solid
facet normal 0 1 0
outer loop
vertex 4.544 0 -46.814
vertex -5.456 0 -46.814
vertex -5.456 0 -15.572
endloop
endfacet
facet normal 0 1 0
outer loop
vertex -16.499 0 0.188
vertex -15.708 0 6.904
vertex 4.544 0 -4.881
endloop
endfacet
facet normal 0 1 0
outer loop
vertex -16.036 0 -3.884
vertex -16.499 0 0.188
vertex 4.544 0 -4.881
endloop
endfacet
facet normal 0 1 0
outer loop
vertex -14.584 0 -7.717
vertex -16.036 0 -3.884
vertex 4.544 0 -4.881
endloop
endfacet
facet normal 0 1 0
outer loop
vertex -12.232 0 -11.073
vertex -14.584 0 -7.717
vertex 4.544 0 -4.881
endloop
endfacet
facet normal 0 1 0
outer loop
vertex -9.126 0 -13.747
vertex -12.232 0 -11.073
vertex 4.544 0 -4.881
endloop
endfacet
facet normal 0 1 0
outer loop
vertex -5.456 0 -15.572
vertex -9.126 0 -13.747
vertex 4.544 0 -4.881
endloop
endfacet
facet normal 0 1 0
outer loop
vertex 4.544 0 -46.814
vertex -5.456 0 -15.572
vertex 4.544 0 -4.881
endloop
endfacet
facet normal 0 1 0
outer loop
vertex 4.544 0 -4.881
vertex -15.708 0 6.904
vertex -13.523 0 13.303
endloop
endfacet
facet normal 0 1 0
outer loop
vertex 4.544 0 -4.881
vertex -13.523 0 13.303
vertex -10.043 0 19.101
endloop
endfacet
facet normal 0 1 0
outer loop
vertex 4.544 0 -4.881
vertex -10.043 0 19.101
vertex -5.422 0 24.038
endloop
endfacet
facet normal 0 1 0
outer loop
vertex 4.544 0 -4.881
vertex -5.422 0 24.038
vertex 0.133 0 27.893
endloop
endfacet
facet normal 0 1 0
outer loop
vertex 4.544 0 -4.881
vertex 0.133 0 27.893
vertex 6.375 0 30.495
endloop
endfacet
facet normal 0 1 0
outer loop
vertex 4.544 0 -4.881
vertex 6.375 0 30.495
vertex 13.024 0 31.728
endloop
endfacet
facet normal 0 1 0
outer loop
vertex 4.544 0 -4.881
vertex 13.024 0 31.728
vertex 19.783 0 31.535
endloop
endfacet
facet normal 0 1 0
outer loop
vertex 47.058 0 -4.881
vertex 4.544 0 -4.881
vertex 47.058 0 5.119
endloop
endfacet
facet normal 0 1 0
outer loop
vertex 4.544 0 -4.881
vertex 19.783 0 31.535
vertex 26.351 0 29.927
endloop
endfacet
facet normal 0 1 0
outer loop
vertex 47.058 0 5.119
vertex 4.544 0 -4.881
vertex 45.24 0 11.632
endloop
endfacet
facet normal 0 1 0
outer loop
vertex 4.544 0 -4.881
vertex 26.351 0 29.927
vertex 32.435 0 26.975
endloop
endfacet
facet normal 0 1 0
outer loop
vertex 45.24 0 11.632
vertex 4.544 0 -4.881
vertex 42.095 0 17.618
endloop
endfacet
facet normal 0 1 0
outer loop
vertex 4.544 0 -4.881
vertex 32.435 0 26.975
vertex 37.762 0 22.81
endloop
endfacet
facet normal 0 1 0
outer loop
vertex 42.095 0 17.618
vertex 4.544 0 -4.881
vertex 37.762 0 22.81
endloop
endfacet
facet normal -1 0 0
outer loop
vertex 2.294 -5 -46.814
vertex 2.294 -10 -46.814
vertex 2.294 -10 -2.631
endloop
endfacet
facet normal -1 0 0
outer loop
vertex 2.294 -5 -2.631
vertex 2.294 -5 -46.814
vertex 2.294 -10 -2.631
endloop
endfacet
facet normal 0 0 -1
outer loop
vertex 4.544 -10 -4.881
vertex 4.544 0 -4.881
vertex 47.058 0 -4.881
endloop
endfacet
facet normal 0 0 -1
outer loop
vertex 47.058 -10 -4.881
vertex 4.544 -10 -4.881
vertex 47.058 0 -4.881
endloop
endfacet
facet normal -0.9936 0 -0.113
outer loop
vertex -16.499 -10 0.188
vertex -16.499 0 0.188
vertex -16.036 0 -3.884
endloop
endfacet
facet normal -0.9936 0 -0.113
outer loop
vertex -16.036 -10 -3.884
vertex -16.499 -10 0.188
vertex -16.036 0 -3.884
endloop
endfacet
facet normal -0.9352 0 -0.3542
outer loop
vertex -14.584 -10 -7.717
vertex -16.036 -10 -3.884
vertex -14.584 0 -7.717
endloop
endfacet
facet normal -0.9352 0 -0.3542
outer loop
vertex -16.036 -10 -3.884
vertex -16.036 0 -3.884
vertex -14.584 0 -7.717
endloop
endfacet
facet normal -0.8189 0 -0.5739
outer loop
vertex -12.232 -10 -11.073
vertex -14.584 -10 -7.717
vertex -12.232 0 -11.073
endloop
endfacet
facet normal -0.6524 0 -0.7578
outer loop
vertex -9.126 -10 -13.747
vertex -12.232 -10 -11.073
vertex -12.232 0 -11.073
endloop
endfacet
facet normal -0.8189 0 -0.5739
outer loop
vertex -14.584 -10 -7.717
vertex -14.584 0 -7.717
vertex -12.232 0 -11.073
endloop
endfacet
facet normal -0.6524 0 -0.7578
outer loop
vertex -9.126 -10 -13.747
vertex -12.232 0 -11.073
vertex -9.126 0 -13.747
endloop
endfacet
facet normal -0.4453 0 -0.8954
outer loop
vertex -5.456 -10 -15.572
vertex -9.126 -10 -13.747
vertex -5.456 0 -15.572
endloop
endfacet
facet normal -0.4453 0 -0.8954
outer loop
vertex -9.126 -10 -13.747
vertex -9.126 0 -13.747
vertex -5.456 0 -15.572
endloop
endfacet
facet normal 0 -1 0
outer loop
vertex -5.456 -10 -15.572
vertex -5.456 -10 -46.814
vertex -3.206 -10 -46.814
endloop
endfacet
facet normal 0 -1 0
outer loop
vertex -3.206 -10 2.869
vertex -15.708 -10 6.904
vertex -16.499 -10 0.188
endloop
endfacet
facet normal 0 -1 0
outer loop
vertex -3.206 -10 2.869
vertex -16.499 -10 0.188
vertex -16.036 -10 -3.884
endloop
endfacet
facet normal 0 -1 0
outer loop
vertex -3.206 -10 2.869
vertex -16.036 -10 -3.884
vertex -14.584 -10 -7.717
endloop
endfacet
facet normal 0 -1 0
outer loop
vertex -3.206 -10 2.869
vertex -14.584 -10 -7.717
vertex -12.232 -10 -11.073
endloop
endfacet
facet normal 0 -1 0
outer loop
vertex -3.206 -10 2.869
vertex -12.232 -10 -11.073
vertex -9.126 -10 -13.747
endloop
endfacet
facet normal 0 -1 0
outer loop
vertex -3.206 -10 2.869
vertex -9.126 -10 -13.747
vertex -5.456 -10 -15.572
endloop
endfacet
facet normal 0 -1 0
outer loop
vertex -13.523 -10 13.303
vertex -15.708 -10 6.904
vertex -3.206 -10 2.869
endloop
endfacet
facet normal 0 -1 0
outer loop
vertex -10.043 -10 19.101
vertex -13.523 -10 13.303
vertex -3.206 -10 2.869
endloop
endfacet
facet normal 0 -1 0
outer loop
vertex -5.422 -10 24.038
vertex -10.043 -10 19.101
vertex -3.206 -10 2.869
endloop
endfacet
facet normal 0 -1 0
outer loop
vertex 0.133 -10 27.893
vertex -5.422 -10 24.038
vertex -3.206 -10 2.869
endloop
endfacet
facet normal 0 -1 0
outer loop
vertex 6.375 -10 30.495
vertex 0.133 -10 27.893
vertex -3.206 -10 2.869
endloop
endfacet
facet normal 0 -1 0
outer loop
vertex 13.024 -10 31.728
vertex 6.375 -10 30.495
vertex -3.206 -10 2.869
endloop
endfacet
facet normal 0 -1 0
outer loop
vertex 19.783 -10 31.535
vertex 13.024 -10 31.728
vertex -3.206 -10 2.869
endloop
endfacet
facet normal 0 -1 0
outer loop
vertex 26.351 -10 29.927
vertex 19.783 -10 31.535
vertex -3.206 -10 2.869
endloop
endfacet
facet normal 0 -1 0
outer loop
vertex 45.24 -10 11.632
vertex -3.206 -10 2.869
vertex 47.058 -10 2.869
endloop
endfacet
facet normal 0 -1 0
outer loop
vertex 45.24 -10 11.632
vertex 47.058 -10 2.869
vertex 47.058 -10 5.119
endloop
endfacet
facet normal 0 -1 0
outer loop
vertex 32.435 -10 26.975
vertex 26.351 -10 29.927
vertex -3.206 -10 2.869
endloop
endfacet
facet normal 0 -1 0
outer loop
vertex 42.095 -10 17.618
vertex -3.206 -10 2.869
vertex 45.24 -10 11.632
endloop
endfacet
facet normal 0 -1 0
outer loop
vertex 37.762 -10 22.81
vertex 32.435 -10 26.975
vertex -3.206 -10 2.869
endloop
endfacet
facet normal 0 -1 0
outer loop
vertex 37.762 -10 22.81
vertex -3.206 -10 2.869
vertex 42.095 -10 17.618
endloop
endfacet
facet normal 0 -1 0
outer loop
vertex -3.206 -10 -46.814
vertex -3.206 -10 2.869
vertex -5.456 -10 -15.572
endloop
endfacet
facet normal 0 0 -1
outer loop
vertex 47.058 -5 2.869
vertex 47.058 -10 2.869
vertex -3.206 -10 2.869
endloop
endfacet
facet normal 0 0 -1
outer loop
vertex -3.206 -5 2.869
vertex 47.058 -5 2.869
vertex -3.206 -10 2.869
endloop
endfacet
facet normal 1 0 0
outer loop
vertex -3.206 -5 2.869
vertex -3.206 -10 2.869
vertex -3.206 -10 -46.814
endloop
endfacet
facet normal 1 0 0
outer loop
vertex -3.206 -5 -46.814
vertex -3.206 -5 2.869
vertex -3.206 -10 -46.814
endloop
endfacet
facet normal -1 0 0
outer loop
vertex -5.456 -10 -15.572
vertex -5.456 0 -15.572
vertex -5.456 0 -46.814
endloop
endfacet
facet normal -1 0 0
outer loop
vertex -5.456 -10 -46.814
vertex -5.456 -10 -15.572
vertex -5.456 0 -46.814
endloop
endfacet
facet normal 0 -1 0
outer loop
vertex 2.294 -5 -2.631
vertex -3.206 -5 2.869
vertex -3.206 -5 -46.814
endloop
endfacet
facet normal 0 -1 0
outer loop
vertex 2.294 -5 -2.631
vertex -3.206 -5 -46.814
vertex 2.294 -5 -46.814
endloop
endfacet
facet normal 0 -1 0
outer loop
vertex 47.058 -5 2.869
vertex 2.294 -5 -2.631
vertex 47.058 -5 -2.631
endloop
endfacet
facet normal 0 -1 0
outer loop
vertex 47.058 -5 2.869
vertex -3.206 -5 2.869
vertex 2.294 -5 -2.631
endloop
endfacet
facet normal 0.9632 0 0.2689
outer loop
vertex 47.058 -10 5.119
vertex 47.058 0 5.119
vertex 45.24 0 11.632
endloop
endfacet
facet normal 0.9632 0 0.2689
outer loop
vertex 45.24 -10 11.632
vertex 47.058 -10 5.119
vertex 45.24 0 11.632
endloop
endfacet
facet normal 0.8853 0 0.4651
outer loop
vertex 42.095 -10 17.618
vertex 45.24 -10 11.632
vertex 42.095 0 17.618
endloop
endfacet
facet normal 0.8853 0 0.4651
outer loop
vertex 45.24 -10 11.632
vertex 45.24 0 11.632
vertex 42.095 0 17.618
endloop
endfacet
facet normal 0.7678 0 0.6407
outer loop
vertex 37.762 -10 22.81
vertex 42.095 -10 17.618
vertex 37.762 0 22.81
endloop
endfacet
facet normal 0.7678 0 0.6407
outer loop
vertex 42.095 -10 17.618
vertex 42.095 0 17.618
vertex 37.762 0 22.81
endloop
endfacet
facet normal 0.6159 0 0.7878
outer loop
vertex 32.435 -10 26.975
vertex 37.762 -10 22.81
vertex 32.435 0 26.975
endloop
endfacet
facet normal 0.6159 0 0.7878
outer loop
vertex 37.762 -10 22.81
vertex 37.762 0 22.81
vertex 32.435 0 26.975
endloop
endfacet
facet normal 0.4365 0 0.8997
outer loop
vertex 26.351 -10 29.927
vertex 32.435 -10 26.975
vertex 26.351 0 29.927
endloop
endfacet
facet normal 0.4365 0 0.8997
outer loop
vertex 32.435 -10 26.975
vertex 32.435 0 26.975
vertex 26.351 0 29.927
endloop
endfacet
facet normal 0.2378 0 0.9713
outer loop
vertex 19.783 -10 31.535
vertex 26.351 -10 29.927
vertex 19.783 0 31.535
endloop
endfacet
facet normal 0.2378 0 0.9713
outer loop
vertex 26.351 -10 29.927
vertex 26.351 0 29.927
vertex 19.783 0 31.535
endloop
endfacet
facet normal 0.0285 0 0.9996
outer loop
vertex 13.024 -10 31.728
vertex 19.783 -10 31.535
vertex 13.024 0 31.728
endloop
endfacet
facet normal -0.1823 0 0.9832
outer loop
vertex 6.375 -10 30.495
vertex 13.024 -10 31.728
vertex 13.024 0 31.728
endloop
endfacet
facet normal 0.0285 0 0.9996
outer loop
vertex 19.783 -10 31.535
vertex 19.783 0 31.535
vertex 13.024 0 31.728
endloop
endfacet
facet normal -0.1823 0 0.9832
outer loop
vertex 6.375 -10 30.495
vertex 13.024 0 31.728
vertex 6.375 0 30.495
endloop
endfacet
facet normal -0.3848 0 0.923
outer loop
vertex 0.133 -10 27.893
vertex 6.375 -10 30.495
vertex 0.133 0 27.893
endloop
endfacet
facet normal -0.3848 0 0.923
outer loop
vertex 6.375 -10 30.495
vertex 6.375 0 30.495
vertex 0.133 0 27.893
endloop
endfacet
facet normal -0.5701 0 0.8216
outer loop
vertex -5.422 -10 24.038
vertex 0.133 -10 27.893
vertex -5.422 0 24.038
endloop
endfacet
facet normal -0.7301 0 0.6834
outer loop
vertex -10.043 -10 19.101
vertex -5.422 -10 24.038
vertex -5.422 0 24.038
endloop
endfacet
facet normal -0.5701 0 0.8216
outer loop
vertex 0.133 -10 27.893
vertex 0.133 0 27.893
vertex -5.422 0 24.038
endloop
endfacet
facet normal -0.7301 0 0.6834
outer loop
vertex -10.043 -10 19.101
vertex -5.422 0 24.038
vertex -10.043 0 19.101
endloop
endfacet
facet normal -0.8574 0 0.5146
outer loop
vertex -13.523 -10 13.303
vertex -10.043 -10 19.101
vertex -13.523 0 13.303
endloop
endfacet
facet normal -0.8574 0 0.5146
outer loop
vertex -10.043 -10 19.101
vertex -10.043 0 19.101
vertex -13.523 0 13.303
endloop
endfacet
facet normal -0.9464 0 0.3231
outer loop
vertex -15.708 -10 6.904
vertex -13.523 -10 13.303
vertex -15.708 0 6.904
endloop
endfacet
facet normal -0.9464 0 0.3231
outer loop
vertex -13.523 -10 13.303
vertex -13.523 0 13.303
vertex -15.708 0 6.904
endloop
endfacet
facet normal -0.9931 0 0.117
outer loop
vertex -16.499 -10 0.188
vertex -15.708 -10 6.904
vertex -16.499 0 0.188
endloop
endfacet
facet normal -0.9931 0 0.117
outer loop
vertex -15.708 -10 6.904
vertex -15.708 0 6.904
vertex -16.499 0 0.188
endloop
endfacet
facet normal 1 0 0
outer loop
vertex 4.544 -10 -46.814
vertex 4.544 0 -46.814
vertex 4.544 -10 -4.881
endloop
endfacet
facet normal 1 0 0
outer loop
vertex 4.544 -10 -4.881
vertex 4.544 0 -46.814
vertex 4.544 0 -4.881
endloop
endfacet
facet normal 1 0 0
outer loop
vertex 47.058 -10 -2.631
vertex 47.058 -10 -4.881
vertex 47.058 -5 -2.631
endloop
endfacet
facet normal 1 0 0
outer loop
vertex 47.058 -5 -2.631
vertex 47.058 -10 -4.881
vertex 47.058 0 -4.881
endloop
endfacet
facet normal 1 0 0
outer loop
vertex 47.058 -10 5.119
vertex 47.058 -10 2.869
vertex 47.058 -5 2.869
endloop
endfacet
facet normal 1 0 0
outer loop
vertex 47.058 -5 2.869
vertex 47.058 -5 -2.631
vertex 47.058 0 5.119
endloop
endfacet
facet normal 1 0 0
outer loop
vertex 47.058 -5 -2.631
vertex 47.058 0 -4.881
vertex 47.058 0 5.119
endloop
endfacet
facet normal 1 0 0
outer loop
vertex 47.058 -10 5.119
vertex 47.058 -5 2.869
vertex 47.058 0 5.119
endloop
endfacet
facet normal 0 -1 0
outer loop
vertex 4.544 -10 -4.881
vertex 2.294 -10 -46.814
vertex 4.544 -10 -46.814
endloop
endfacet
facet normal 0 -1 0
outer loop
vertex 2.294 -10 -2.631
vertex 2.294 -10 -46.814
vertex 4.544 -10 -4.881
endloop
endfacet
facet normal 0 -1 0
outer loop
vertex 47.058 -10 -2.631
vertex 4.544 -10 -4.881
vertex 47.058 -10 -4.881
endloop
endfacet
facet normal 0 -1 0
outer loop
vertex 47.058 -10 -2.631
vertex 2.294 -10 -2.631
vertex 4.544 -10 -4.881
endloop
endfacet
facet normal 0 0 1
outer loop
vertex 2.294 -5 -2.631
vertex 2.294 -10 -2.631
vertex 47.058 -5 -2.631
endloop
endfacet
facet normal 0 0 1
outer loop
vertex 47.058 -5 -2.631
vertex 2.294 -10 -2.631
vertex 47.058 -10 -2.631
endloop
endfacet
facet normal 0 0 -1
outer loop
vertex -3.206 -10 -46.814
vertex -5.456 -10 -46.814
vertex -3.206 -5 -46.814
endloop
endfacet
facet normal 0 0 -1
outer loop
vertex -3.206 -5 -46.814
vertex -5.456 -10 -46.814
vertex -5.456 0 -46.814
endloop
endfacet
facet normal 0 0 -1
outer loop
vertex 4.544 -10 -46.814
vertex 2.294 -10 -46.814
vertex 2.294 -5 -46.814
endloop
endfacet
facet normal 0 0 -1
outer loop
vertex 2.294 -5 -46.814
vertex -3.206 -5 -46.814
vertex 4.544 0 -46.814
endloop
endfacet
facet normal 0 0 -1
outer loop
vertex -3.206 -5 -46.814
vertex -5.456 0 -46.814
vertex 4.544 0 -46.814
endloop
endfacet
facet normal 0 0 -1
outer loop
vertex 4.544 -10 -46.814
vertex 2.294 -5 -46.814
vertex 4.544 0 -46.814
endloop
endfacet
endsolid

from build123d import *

# Parameters (mm, degrees)
F1_DEPTH = 10
F3_DEPTH = 5


# Not quite as in the source:
# - a feature names something its author has since deleted; it is built from what else it names


with BuildPart() as f1:
    # F0 (on Front) → F1 (new body)
    with BuildSketch(Plane.XZ):
        with BuildLine():
            Line((4.5435639801, -4.8811539246), (47.0578219503, -4.8811539246))
            Line((47.0578219503, -4.8811539246), (47.0578219503, 5.1188460754))
            ThreePointArc((47.0578219503, 5.1188460754), (13.0237482483, 31.7276460361), (-16.4989304836, 0.1878640363))
            ThreePointArc((-16.4989304836, 0.1878640363), (-13.5129700245, -9.4683494399), (-5.4564360199, -15.5716828237))
            Line((-5.4564360199, -15.5716828237), (-5.4564360199, -46.8141730692))
            Line((-5.4564360199, -46.8141730692), (4.5435639801, -46.8141730692))
            Line((4.5435639801, -46.8141730692), (4.5435639801, -4.8811539246))
        make_face()
    extrude(amount=F1_DEPTH)

    # F2 (on face) → F3 (cut)
    with BuildSketch(Plane.XZ.offset(10)):
        Polygon((47.0578219503, -2.6311539246), (47.0578219503, 2.8688460754), (-3.2064360199, 2.8688460754), (-3.2064360199, -2.6311539246), (-3.2064360199, -46.8141730692), (2.2935639801, -46.8141730692), (2.2935639801, -2.6311539246), align=None)
    extrude(amount=-F3_DEPTH, mode=Mode.SUBTRACT)


solid = f1.part
